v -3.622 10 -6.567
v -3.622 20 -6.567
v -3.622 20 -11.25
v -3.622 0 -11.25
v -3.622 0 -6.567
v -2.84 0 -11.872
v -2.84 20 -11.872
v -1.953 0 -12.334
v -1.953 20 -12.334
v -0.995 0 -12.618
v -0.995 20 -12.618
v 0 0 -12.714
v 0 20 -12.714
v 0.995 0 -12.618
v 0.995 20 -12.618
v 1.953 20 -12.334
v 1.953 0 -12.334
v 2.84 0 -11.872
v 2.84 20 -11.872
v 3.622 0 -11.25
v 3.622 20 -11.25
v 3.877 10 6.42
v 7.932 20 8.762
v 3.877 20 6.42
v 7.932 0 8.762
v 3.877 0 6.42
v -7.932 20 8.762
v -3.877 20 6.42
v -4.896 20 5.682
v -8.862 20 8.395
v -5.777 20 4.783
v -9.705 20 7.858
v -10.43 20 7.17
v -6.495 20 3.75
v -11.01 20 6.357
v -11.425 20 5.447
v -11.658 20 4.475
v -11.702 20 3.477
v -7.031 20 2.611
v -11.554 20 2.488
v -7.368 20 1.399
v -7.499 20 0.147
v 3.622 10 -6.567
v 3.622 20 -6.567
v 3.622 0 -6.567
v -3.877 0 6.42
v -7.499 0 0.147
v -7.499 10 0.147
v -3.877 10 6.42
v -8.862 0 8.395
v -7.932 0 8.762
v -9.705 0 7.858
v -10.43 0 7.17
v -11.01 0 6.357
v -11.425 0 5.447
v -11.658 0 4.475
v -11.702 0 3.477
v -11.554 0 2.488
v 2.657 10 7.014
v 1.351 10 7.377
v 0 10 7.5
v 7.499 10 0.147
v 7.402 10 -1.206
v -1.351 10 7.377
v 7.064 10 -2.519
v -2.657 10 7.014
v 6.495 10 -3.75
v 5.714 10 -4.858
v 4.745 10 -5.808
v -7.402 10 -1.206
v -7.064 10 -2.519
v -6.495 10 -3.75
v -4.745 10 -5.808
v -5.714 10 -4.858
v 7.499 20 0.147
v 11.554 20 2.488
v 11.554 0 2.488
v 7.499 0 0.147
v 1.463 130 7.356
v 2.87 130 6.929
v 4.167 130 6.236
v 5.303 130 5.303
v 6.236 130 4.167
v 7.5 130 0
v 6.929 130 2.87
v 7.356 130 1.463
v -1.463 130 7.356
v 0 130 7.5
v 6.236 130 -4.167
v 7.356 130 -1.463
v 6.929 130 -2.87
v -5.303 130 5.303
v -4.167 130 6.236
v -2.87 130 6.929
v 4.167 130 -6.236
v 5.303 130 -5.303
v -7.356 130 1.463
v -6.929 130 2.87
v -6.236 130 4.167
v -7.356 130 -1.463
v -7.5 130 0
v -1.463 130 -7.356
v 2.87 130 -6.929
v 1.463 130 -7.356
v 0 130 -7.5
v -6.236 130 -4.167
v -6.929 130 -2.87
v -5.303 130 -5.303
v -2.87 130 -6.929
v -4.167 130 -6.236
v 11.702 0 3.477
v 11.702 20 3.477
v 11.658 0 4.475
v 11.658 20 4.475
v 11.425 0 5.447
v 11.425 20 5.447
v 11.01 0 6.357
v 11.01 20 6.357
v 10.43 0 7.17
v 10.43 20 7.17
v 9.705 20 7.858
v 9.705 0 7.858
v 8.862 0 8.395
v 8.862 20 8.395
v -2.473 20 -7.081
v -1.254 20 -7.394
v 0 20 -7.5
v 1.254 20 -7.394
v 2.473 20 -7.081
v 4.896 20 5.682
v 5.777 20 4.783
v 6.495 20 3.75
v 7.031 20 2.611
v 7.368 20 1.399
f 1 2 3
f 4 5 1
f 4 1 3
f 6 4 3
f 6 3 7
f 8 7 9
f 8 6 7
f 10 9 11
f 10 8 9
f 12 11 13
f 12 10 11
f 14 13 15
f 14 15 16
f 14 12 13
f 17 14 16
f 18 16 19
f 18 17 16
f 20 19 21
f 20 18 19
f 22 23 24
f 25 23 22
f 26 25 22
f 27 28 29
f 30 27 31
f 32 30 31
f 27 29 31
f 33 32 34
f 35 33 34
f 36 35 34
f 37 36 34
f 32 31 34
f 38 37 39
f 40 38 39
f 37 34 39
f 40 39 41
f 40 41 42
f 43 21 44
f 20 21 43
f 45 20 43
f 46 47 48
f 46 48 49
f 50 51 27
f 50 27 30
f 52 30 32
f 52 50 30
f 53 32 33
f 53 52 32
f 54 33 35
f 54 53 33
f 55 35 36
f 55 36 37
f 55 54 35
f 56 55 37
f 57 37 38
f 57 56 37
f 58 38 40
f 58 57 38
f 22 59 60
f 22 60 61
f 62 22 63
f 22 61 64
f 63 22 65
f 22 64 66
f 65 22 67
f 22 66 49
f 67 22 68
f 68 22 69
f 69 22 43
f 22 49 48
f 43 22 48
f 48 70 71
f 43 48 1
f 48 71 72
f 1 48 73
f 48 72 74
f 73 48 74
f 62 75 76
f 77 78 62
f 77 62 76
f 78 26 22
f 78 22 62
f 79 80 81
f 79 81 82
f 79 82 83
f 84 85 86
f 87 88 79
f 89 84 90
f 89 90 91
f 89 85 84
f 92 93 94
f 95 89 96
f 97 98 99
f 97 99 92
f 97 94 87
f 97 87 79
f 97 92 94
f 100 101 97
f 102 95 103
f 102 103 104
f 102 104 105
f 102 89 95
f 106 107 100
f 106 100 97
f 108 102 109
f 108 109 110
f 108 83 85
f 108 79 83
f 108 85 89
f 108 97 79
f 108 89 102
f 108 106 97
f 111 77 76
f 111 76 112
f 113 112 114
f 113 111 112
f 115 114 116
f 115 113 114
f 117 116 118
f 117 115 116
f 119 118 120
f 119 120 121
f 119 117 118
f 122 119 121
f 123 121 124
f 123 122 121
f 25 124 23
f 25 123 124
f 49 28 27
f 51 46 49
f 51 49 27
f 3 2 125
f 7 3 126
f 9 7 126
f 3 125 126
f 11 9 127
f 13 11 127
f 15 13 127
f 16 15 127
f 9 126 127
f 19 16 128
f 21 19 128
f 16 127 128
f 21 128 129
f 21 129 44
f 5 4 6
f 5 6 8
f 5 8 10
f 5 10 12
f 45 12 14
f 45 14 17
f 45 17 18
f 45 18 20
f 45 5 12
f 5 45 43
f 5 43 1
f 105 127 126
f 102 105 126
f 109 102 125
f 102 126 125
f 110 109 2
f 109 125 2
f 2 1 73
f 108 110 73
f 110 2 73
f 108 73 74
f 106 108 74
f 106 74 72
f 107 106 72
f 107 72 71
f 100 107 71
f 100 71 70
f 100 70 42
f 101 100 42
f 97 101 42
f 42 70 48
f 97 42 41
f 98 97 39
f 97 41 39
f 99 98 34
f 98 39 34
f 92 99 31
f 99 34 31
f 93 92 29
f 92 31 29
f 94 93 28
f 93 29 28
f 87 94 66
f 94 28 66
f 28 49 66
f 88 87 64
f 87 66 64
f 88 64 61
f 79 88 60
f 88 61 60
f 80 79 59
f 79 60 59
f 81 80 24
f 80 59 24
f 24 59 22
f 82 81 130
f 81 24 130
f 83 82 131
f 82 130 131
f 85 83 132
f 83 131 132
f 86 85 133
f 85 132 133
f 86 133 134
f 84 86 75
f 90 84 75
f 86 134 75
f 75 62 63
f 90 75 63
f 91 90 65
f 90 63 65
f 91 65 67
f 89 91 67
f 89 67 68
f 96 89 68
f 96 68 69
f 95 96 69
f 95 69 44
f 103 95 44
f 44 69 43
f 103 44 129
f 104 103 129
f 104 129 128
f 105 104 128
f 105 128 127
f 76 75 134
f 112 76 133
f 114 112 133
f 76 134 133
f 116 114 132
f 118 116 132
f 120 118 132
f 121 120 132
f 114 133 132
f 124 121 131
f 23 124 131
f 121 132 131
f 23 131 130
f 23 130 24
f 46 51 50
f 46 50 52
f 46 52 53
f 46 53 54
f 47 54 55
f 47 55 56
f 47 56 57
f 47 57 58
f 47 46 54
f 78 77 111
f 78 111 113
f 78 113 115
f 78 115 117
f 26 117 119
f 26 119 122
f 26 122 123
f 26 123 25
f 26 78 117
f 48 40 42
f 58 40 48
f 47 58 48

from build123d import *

# Parameters (mm, degrees)
BOSS_EXTRU_1_START           = 10
ESQUISSE1_R                  = 7.5
BOSS_EXTRU_1_DEPTH           = 120
BOSS_EXTRU_2_START           = 10
BOSS_EXTRU_2_DEPTH           = 20
R_P_TITION_CIRCULAIRE1_COUNT = 3


with BuildPart() as part:
    # Esquisse1 → Boss.-Extru.1 (new body)
    with BuildSketch(Plane(origin=(0, 0, 0), x_dir=(1, 0, 0), z_dir=(0, 1, 0)).offset(BOSS_EXTRU_1_START)):
        with Locations(Location((0, 0, 0), (0, 0, 90))):
            Circle(ESQUISSE1_R)
    extrude(amount=BOSS_EXTRU_1_DEPTH)

    # Esquisse3 → Boss.-Extru.2 (add)
    with BuildSketch(Plane.XZ.offset(-10).offset(BOSS_EXTRU_2_START)):
        with BuildLine():
            Line((3.621916752, -6.567474327), (-3.621916752, -6.567474327))
            Line((-3.621916752, -6.567474327), (-3.621916752, -11.25))
            ThreePointArc((-3.621916752, -11.25), (0, -12.713519057), (3.621916752, -11.25))
            Line((3.621916752, -11.25), (3.621916752, -6.567474327))
        make_face()
    boss_extru_2 = extrude(amount=-BOSS_EXTRU_2_DEPTH)

    # Répétition circulaire1: Boss.-Extru.2 ×3 about axis
    r_p_tition_circulaire1_axis = Axis((0, 0, 0), (0, 1, 0))
    for i in range(1, R_P_TITION_CIRCULAIRE1_COUNT):
        add(boss_extru_2.rotate(r_p_tition_circulaire1_axis, i * 360 / R_P_TITION_CIRCULAIRE1_COUNT))


solid = part.part
